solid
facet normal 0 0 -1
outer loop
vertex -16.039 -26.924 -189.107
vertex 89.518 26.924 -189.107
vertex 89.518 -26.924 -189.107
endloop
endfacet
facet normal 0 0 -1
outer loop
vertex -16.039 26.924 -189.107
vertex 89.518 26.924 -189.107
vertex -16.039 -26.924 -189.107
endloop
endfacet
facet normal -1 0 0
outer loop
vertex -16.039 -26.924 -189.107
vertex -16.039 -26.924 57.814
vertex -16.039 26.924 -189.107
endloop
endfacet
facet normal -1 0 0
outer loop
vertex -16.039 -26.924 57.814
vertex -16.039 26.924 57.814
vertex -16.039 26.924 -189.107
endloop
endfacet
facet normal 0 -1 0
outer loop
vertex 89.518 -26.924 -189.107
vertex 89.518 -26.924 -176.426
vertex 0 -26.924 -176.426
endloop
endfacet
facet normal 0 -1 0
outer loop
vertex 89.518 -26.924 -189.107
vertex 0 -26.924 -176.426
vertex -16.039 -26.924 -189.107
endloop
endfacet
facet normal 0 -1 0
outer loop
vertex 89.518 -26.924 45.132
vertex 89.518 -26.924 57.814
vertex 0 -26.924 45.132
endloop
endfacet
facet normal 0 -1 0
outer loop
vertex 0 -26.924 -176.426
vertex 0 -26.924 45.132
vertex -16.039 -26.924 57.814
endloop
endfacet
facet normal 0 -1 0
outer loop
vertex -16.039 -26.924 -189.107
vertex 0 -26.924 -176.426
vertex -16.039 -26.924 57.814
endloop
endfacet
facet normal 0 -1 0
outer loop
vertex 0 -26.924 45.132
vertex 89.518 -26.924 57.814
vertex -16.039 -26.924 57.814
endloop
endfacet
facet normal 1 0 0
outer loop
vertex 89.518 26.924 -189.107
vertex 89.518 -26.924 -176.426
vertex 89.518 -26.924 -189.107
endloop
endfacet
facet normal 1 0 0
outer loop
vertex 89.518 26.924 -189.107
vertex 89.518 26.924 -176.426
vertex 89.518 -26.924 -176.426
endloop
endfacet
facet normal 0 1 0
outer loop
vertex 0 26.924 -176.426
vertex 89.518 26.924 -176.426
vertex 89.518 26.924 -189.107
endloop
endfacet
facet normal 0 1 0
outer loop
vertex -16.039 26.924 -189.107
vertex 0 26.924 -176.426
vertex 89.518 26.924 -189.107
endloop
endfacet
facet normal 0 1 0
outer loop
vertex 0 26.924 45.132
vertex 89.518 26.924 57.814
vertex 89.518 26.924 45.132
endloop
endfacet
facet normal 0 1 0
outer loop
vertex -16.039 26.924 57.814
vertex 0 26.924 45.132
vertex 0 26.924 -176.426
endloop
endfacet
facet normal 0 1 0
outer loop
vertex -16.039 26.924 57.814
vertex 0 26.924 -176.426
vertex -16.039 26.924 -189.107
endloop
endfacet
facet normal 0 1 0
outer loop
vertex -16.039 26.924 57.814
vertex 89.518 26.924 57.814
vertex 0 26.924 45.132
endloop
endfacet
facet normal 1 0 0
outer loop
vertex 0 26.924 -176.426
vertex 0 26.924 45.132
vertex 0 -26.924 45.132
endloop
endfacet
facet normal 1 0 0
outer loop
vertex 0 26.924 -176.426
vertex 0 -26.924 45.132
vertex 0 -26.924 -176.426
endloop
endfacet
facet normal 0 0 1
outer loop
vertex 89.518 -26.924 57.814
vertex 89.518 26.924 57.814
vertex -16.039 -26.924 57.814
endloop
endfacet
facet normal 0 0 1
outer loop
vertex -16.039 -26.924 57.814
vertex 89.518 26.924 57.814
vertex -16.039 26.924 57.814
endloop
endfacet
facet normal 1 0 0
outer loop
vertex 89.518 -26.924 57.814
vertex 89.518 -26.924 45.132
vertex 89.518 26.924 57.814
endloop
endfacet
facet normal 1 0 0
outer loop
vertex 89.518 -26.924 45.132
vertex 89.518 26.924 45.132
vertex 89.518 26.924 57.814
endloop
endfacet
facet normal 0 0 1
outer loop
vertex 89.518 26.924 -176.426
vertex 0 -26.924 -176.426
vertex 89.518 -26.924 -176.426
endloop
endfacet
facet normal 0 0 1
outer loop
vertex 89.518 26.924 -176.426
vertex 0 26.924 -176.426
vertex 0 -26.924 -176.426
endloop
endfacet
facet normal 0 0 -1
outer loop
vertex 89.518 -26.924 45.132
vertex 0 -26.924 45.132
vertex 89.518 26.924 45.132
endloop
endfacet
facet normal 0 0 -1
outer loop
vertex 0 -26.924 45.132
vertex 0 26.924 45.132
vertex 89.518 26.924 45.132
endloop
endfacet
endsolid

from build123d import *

# Parameters (mm, degrees)
BOSS_EXTRUDE1_DEPTH = 26.924


with BuildPart() as part:
    # Sketch1 → Boss-Extrude1 (new, symmetric)
    with BuildSketch(Plane(origin=(0, 0, 0), x_dir=(1, 0, 0), z_dir=(0, 1, 0))):
        Polygon((-16.038691669, 65.646737994), (0, 65.646737994), (0, -45.132132371), (89.518279083, -45.132132371), (89.518279083, -57.813888574), (-16.038691669, -57.813888574), (-16.038691669, -45.132132371), align=None)
    boss_extrude1 = extrude(amount=BOSS_EXTRUDE1_DEPTH, both=True)

    # Mirror1: Boss-Extrude1 across plane
    add(boss_extrude1.mirror(Plane(origin=(-16.038691669, 26.924, -65.646737994), x_dir=(1, 0, 0), z_dir=(0, 0, 1))))


solid = part.part
